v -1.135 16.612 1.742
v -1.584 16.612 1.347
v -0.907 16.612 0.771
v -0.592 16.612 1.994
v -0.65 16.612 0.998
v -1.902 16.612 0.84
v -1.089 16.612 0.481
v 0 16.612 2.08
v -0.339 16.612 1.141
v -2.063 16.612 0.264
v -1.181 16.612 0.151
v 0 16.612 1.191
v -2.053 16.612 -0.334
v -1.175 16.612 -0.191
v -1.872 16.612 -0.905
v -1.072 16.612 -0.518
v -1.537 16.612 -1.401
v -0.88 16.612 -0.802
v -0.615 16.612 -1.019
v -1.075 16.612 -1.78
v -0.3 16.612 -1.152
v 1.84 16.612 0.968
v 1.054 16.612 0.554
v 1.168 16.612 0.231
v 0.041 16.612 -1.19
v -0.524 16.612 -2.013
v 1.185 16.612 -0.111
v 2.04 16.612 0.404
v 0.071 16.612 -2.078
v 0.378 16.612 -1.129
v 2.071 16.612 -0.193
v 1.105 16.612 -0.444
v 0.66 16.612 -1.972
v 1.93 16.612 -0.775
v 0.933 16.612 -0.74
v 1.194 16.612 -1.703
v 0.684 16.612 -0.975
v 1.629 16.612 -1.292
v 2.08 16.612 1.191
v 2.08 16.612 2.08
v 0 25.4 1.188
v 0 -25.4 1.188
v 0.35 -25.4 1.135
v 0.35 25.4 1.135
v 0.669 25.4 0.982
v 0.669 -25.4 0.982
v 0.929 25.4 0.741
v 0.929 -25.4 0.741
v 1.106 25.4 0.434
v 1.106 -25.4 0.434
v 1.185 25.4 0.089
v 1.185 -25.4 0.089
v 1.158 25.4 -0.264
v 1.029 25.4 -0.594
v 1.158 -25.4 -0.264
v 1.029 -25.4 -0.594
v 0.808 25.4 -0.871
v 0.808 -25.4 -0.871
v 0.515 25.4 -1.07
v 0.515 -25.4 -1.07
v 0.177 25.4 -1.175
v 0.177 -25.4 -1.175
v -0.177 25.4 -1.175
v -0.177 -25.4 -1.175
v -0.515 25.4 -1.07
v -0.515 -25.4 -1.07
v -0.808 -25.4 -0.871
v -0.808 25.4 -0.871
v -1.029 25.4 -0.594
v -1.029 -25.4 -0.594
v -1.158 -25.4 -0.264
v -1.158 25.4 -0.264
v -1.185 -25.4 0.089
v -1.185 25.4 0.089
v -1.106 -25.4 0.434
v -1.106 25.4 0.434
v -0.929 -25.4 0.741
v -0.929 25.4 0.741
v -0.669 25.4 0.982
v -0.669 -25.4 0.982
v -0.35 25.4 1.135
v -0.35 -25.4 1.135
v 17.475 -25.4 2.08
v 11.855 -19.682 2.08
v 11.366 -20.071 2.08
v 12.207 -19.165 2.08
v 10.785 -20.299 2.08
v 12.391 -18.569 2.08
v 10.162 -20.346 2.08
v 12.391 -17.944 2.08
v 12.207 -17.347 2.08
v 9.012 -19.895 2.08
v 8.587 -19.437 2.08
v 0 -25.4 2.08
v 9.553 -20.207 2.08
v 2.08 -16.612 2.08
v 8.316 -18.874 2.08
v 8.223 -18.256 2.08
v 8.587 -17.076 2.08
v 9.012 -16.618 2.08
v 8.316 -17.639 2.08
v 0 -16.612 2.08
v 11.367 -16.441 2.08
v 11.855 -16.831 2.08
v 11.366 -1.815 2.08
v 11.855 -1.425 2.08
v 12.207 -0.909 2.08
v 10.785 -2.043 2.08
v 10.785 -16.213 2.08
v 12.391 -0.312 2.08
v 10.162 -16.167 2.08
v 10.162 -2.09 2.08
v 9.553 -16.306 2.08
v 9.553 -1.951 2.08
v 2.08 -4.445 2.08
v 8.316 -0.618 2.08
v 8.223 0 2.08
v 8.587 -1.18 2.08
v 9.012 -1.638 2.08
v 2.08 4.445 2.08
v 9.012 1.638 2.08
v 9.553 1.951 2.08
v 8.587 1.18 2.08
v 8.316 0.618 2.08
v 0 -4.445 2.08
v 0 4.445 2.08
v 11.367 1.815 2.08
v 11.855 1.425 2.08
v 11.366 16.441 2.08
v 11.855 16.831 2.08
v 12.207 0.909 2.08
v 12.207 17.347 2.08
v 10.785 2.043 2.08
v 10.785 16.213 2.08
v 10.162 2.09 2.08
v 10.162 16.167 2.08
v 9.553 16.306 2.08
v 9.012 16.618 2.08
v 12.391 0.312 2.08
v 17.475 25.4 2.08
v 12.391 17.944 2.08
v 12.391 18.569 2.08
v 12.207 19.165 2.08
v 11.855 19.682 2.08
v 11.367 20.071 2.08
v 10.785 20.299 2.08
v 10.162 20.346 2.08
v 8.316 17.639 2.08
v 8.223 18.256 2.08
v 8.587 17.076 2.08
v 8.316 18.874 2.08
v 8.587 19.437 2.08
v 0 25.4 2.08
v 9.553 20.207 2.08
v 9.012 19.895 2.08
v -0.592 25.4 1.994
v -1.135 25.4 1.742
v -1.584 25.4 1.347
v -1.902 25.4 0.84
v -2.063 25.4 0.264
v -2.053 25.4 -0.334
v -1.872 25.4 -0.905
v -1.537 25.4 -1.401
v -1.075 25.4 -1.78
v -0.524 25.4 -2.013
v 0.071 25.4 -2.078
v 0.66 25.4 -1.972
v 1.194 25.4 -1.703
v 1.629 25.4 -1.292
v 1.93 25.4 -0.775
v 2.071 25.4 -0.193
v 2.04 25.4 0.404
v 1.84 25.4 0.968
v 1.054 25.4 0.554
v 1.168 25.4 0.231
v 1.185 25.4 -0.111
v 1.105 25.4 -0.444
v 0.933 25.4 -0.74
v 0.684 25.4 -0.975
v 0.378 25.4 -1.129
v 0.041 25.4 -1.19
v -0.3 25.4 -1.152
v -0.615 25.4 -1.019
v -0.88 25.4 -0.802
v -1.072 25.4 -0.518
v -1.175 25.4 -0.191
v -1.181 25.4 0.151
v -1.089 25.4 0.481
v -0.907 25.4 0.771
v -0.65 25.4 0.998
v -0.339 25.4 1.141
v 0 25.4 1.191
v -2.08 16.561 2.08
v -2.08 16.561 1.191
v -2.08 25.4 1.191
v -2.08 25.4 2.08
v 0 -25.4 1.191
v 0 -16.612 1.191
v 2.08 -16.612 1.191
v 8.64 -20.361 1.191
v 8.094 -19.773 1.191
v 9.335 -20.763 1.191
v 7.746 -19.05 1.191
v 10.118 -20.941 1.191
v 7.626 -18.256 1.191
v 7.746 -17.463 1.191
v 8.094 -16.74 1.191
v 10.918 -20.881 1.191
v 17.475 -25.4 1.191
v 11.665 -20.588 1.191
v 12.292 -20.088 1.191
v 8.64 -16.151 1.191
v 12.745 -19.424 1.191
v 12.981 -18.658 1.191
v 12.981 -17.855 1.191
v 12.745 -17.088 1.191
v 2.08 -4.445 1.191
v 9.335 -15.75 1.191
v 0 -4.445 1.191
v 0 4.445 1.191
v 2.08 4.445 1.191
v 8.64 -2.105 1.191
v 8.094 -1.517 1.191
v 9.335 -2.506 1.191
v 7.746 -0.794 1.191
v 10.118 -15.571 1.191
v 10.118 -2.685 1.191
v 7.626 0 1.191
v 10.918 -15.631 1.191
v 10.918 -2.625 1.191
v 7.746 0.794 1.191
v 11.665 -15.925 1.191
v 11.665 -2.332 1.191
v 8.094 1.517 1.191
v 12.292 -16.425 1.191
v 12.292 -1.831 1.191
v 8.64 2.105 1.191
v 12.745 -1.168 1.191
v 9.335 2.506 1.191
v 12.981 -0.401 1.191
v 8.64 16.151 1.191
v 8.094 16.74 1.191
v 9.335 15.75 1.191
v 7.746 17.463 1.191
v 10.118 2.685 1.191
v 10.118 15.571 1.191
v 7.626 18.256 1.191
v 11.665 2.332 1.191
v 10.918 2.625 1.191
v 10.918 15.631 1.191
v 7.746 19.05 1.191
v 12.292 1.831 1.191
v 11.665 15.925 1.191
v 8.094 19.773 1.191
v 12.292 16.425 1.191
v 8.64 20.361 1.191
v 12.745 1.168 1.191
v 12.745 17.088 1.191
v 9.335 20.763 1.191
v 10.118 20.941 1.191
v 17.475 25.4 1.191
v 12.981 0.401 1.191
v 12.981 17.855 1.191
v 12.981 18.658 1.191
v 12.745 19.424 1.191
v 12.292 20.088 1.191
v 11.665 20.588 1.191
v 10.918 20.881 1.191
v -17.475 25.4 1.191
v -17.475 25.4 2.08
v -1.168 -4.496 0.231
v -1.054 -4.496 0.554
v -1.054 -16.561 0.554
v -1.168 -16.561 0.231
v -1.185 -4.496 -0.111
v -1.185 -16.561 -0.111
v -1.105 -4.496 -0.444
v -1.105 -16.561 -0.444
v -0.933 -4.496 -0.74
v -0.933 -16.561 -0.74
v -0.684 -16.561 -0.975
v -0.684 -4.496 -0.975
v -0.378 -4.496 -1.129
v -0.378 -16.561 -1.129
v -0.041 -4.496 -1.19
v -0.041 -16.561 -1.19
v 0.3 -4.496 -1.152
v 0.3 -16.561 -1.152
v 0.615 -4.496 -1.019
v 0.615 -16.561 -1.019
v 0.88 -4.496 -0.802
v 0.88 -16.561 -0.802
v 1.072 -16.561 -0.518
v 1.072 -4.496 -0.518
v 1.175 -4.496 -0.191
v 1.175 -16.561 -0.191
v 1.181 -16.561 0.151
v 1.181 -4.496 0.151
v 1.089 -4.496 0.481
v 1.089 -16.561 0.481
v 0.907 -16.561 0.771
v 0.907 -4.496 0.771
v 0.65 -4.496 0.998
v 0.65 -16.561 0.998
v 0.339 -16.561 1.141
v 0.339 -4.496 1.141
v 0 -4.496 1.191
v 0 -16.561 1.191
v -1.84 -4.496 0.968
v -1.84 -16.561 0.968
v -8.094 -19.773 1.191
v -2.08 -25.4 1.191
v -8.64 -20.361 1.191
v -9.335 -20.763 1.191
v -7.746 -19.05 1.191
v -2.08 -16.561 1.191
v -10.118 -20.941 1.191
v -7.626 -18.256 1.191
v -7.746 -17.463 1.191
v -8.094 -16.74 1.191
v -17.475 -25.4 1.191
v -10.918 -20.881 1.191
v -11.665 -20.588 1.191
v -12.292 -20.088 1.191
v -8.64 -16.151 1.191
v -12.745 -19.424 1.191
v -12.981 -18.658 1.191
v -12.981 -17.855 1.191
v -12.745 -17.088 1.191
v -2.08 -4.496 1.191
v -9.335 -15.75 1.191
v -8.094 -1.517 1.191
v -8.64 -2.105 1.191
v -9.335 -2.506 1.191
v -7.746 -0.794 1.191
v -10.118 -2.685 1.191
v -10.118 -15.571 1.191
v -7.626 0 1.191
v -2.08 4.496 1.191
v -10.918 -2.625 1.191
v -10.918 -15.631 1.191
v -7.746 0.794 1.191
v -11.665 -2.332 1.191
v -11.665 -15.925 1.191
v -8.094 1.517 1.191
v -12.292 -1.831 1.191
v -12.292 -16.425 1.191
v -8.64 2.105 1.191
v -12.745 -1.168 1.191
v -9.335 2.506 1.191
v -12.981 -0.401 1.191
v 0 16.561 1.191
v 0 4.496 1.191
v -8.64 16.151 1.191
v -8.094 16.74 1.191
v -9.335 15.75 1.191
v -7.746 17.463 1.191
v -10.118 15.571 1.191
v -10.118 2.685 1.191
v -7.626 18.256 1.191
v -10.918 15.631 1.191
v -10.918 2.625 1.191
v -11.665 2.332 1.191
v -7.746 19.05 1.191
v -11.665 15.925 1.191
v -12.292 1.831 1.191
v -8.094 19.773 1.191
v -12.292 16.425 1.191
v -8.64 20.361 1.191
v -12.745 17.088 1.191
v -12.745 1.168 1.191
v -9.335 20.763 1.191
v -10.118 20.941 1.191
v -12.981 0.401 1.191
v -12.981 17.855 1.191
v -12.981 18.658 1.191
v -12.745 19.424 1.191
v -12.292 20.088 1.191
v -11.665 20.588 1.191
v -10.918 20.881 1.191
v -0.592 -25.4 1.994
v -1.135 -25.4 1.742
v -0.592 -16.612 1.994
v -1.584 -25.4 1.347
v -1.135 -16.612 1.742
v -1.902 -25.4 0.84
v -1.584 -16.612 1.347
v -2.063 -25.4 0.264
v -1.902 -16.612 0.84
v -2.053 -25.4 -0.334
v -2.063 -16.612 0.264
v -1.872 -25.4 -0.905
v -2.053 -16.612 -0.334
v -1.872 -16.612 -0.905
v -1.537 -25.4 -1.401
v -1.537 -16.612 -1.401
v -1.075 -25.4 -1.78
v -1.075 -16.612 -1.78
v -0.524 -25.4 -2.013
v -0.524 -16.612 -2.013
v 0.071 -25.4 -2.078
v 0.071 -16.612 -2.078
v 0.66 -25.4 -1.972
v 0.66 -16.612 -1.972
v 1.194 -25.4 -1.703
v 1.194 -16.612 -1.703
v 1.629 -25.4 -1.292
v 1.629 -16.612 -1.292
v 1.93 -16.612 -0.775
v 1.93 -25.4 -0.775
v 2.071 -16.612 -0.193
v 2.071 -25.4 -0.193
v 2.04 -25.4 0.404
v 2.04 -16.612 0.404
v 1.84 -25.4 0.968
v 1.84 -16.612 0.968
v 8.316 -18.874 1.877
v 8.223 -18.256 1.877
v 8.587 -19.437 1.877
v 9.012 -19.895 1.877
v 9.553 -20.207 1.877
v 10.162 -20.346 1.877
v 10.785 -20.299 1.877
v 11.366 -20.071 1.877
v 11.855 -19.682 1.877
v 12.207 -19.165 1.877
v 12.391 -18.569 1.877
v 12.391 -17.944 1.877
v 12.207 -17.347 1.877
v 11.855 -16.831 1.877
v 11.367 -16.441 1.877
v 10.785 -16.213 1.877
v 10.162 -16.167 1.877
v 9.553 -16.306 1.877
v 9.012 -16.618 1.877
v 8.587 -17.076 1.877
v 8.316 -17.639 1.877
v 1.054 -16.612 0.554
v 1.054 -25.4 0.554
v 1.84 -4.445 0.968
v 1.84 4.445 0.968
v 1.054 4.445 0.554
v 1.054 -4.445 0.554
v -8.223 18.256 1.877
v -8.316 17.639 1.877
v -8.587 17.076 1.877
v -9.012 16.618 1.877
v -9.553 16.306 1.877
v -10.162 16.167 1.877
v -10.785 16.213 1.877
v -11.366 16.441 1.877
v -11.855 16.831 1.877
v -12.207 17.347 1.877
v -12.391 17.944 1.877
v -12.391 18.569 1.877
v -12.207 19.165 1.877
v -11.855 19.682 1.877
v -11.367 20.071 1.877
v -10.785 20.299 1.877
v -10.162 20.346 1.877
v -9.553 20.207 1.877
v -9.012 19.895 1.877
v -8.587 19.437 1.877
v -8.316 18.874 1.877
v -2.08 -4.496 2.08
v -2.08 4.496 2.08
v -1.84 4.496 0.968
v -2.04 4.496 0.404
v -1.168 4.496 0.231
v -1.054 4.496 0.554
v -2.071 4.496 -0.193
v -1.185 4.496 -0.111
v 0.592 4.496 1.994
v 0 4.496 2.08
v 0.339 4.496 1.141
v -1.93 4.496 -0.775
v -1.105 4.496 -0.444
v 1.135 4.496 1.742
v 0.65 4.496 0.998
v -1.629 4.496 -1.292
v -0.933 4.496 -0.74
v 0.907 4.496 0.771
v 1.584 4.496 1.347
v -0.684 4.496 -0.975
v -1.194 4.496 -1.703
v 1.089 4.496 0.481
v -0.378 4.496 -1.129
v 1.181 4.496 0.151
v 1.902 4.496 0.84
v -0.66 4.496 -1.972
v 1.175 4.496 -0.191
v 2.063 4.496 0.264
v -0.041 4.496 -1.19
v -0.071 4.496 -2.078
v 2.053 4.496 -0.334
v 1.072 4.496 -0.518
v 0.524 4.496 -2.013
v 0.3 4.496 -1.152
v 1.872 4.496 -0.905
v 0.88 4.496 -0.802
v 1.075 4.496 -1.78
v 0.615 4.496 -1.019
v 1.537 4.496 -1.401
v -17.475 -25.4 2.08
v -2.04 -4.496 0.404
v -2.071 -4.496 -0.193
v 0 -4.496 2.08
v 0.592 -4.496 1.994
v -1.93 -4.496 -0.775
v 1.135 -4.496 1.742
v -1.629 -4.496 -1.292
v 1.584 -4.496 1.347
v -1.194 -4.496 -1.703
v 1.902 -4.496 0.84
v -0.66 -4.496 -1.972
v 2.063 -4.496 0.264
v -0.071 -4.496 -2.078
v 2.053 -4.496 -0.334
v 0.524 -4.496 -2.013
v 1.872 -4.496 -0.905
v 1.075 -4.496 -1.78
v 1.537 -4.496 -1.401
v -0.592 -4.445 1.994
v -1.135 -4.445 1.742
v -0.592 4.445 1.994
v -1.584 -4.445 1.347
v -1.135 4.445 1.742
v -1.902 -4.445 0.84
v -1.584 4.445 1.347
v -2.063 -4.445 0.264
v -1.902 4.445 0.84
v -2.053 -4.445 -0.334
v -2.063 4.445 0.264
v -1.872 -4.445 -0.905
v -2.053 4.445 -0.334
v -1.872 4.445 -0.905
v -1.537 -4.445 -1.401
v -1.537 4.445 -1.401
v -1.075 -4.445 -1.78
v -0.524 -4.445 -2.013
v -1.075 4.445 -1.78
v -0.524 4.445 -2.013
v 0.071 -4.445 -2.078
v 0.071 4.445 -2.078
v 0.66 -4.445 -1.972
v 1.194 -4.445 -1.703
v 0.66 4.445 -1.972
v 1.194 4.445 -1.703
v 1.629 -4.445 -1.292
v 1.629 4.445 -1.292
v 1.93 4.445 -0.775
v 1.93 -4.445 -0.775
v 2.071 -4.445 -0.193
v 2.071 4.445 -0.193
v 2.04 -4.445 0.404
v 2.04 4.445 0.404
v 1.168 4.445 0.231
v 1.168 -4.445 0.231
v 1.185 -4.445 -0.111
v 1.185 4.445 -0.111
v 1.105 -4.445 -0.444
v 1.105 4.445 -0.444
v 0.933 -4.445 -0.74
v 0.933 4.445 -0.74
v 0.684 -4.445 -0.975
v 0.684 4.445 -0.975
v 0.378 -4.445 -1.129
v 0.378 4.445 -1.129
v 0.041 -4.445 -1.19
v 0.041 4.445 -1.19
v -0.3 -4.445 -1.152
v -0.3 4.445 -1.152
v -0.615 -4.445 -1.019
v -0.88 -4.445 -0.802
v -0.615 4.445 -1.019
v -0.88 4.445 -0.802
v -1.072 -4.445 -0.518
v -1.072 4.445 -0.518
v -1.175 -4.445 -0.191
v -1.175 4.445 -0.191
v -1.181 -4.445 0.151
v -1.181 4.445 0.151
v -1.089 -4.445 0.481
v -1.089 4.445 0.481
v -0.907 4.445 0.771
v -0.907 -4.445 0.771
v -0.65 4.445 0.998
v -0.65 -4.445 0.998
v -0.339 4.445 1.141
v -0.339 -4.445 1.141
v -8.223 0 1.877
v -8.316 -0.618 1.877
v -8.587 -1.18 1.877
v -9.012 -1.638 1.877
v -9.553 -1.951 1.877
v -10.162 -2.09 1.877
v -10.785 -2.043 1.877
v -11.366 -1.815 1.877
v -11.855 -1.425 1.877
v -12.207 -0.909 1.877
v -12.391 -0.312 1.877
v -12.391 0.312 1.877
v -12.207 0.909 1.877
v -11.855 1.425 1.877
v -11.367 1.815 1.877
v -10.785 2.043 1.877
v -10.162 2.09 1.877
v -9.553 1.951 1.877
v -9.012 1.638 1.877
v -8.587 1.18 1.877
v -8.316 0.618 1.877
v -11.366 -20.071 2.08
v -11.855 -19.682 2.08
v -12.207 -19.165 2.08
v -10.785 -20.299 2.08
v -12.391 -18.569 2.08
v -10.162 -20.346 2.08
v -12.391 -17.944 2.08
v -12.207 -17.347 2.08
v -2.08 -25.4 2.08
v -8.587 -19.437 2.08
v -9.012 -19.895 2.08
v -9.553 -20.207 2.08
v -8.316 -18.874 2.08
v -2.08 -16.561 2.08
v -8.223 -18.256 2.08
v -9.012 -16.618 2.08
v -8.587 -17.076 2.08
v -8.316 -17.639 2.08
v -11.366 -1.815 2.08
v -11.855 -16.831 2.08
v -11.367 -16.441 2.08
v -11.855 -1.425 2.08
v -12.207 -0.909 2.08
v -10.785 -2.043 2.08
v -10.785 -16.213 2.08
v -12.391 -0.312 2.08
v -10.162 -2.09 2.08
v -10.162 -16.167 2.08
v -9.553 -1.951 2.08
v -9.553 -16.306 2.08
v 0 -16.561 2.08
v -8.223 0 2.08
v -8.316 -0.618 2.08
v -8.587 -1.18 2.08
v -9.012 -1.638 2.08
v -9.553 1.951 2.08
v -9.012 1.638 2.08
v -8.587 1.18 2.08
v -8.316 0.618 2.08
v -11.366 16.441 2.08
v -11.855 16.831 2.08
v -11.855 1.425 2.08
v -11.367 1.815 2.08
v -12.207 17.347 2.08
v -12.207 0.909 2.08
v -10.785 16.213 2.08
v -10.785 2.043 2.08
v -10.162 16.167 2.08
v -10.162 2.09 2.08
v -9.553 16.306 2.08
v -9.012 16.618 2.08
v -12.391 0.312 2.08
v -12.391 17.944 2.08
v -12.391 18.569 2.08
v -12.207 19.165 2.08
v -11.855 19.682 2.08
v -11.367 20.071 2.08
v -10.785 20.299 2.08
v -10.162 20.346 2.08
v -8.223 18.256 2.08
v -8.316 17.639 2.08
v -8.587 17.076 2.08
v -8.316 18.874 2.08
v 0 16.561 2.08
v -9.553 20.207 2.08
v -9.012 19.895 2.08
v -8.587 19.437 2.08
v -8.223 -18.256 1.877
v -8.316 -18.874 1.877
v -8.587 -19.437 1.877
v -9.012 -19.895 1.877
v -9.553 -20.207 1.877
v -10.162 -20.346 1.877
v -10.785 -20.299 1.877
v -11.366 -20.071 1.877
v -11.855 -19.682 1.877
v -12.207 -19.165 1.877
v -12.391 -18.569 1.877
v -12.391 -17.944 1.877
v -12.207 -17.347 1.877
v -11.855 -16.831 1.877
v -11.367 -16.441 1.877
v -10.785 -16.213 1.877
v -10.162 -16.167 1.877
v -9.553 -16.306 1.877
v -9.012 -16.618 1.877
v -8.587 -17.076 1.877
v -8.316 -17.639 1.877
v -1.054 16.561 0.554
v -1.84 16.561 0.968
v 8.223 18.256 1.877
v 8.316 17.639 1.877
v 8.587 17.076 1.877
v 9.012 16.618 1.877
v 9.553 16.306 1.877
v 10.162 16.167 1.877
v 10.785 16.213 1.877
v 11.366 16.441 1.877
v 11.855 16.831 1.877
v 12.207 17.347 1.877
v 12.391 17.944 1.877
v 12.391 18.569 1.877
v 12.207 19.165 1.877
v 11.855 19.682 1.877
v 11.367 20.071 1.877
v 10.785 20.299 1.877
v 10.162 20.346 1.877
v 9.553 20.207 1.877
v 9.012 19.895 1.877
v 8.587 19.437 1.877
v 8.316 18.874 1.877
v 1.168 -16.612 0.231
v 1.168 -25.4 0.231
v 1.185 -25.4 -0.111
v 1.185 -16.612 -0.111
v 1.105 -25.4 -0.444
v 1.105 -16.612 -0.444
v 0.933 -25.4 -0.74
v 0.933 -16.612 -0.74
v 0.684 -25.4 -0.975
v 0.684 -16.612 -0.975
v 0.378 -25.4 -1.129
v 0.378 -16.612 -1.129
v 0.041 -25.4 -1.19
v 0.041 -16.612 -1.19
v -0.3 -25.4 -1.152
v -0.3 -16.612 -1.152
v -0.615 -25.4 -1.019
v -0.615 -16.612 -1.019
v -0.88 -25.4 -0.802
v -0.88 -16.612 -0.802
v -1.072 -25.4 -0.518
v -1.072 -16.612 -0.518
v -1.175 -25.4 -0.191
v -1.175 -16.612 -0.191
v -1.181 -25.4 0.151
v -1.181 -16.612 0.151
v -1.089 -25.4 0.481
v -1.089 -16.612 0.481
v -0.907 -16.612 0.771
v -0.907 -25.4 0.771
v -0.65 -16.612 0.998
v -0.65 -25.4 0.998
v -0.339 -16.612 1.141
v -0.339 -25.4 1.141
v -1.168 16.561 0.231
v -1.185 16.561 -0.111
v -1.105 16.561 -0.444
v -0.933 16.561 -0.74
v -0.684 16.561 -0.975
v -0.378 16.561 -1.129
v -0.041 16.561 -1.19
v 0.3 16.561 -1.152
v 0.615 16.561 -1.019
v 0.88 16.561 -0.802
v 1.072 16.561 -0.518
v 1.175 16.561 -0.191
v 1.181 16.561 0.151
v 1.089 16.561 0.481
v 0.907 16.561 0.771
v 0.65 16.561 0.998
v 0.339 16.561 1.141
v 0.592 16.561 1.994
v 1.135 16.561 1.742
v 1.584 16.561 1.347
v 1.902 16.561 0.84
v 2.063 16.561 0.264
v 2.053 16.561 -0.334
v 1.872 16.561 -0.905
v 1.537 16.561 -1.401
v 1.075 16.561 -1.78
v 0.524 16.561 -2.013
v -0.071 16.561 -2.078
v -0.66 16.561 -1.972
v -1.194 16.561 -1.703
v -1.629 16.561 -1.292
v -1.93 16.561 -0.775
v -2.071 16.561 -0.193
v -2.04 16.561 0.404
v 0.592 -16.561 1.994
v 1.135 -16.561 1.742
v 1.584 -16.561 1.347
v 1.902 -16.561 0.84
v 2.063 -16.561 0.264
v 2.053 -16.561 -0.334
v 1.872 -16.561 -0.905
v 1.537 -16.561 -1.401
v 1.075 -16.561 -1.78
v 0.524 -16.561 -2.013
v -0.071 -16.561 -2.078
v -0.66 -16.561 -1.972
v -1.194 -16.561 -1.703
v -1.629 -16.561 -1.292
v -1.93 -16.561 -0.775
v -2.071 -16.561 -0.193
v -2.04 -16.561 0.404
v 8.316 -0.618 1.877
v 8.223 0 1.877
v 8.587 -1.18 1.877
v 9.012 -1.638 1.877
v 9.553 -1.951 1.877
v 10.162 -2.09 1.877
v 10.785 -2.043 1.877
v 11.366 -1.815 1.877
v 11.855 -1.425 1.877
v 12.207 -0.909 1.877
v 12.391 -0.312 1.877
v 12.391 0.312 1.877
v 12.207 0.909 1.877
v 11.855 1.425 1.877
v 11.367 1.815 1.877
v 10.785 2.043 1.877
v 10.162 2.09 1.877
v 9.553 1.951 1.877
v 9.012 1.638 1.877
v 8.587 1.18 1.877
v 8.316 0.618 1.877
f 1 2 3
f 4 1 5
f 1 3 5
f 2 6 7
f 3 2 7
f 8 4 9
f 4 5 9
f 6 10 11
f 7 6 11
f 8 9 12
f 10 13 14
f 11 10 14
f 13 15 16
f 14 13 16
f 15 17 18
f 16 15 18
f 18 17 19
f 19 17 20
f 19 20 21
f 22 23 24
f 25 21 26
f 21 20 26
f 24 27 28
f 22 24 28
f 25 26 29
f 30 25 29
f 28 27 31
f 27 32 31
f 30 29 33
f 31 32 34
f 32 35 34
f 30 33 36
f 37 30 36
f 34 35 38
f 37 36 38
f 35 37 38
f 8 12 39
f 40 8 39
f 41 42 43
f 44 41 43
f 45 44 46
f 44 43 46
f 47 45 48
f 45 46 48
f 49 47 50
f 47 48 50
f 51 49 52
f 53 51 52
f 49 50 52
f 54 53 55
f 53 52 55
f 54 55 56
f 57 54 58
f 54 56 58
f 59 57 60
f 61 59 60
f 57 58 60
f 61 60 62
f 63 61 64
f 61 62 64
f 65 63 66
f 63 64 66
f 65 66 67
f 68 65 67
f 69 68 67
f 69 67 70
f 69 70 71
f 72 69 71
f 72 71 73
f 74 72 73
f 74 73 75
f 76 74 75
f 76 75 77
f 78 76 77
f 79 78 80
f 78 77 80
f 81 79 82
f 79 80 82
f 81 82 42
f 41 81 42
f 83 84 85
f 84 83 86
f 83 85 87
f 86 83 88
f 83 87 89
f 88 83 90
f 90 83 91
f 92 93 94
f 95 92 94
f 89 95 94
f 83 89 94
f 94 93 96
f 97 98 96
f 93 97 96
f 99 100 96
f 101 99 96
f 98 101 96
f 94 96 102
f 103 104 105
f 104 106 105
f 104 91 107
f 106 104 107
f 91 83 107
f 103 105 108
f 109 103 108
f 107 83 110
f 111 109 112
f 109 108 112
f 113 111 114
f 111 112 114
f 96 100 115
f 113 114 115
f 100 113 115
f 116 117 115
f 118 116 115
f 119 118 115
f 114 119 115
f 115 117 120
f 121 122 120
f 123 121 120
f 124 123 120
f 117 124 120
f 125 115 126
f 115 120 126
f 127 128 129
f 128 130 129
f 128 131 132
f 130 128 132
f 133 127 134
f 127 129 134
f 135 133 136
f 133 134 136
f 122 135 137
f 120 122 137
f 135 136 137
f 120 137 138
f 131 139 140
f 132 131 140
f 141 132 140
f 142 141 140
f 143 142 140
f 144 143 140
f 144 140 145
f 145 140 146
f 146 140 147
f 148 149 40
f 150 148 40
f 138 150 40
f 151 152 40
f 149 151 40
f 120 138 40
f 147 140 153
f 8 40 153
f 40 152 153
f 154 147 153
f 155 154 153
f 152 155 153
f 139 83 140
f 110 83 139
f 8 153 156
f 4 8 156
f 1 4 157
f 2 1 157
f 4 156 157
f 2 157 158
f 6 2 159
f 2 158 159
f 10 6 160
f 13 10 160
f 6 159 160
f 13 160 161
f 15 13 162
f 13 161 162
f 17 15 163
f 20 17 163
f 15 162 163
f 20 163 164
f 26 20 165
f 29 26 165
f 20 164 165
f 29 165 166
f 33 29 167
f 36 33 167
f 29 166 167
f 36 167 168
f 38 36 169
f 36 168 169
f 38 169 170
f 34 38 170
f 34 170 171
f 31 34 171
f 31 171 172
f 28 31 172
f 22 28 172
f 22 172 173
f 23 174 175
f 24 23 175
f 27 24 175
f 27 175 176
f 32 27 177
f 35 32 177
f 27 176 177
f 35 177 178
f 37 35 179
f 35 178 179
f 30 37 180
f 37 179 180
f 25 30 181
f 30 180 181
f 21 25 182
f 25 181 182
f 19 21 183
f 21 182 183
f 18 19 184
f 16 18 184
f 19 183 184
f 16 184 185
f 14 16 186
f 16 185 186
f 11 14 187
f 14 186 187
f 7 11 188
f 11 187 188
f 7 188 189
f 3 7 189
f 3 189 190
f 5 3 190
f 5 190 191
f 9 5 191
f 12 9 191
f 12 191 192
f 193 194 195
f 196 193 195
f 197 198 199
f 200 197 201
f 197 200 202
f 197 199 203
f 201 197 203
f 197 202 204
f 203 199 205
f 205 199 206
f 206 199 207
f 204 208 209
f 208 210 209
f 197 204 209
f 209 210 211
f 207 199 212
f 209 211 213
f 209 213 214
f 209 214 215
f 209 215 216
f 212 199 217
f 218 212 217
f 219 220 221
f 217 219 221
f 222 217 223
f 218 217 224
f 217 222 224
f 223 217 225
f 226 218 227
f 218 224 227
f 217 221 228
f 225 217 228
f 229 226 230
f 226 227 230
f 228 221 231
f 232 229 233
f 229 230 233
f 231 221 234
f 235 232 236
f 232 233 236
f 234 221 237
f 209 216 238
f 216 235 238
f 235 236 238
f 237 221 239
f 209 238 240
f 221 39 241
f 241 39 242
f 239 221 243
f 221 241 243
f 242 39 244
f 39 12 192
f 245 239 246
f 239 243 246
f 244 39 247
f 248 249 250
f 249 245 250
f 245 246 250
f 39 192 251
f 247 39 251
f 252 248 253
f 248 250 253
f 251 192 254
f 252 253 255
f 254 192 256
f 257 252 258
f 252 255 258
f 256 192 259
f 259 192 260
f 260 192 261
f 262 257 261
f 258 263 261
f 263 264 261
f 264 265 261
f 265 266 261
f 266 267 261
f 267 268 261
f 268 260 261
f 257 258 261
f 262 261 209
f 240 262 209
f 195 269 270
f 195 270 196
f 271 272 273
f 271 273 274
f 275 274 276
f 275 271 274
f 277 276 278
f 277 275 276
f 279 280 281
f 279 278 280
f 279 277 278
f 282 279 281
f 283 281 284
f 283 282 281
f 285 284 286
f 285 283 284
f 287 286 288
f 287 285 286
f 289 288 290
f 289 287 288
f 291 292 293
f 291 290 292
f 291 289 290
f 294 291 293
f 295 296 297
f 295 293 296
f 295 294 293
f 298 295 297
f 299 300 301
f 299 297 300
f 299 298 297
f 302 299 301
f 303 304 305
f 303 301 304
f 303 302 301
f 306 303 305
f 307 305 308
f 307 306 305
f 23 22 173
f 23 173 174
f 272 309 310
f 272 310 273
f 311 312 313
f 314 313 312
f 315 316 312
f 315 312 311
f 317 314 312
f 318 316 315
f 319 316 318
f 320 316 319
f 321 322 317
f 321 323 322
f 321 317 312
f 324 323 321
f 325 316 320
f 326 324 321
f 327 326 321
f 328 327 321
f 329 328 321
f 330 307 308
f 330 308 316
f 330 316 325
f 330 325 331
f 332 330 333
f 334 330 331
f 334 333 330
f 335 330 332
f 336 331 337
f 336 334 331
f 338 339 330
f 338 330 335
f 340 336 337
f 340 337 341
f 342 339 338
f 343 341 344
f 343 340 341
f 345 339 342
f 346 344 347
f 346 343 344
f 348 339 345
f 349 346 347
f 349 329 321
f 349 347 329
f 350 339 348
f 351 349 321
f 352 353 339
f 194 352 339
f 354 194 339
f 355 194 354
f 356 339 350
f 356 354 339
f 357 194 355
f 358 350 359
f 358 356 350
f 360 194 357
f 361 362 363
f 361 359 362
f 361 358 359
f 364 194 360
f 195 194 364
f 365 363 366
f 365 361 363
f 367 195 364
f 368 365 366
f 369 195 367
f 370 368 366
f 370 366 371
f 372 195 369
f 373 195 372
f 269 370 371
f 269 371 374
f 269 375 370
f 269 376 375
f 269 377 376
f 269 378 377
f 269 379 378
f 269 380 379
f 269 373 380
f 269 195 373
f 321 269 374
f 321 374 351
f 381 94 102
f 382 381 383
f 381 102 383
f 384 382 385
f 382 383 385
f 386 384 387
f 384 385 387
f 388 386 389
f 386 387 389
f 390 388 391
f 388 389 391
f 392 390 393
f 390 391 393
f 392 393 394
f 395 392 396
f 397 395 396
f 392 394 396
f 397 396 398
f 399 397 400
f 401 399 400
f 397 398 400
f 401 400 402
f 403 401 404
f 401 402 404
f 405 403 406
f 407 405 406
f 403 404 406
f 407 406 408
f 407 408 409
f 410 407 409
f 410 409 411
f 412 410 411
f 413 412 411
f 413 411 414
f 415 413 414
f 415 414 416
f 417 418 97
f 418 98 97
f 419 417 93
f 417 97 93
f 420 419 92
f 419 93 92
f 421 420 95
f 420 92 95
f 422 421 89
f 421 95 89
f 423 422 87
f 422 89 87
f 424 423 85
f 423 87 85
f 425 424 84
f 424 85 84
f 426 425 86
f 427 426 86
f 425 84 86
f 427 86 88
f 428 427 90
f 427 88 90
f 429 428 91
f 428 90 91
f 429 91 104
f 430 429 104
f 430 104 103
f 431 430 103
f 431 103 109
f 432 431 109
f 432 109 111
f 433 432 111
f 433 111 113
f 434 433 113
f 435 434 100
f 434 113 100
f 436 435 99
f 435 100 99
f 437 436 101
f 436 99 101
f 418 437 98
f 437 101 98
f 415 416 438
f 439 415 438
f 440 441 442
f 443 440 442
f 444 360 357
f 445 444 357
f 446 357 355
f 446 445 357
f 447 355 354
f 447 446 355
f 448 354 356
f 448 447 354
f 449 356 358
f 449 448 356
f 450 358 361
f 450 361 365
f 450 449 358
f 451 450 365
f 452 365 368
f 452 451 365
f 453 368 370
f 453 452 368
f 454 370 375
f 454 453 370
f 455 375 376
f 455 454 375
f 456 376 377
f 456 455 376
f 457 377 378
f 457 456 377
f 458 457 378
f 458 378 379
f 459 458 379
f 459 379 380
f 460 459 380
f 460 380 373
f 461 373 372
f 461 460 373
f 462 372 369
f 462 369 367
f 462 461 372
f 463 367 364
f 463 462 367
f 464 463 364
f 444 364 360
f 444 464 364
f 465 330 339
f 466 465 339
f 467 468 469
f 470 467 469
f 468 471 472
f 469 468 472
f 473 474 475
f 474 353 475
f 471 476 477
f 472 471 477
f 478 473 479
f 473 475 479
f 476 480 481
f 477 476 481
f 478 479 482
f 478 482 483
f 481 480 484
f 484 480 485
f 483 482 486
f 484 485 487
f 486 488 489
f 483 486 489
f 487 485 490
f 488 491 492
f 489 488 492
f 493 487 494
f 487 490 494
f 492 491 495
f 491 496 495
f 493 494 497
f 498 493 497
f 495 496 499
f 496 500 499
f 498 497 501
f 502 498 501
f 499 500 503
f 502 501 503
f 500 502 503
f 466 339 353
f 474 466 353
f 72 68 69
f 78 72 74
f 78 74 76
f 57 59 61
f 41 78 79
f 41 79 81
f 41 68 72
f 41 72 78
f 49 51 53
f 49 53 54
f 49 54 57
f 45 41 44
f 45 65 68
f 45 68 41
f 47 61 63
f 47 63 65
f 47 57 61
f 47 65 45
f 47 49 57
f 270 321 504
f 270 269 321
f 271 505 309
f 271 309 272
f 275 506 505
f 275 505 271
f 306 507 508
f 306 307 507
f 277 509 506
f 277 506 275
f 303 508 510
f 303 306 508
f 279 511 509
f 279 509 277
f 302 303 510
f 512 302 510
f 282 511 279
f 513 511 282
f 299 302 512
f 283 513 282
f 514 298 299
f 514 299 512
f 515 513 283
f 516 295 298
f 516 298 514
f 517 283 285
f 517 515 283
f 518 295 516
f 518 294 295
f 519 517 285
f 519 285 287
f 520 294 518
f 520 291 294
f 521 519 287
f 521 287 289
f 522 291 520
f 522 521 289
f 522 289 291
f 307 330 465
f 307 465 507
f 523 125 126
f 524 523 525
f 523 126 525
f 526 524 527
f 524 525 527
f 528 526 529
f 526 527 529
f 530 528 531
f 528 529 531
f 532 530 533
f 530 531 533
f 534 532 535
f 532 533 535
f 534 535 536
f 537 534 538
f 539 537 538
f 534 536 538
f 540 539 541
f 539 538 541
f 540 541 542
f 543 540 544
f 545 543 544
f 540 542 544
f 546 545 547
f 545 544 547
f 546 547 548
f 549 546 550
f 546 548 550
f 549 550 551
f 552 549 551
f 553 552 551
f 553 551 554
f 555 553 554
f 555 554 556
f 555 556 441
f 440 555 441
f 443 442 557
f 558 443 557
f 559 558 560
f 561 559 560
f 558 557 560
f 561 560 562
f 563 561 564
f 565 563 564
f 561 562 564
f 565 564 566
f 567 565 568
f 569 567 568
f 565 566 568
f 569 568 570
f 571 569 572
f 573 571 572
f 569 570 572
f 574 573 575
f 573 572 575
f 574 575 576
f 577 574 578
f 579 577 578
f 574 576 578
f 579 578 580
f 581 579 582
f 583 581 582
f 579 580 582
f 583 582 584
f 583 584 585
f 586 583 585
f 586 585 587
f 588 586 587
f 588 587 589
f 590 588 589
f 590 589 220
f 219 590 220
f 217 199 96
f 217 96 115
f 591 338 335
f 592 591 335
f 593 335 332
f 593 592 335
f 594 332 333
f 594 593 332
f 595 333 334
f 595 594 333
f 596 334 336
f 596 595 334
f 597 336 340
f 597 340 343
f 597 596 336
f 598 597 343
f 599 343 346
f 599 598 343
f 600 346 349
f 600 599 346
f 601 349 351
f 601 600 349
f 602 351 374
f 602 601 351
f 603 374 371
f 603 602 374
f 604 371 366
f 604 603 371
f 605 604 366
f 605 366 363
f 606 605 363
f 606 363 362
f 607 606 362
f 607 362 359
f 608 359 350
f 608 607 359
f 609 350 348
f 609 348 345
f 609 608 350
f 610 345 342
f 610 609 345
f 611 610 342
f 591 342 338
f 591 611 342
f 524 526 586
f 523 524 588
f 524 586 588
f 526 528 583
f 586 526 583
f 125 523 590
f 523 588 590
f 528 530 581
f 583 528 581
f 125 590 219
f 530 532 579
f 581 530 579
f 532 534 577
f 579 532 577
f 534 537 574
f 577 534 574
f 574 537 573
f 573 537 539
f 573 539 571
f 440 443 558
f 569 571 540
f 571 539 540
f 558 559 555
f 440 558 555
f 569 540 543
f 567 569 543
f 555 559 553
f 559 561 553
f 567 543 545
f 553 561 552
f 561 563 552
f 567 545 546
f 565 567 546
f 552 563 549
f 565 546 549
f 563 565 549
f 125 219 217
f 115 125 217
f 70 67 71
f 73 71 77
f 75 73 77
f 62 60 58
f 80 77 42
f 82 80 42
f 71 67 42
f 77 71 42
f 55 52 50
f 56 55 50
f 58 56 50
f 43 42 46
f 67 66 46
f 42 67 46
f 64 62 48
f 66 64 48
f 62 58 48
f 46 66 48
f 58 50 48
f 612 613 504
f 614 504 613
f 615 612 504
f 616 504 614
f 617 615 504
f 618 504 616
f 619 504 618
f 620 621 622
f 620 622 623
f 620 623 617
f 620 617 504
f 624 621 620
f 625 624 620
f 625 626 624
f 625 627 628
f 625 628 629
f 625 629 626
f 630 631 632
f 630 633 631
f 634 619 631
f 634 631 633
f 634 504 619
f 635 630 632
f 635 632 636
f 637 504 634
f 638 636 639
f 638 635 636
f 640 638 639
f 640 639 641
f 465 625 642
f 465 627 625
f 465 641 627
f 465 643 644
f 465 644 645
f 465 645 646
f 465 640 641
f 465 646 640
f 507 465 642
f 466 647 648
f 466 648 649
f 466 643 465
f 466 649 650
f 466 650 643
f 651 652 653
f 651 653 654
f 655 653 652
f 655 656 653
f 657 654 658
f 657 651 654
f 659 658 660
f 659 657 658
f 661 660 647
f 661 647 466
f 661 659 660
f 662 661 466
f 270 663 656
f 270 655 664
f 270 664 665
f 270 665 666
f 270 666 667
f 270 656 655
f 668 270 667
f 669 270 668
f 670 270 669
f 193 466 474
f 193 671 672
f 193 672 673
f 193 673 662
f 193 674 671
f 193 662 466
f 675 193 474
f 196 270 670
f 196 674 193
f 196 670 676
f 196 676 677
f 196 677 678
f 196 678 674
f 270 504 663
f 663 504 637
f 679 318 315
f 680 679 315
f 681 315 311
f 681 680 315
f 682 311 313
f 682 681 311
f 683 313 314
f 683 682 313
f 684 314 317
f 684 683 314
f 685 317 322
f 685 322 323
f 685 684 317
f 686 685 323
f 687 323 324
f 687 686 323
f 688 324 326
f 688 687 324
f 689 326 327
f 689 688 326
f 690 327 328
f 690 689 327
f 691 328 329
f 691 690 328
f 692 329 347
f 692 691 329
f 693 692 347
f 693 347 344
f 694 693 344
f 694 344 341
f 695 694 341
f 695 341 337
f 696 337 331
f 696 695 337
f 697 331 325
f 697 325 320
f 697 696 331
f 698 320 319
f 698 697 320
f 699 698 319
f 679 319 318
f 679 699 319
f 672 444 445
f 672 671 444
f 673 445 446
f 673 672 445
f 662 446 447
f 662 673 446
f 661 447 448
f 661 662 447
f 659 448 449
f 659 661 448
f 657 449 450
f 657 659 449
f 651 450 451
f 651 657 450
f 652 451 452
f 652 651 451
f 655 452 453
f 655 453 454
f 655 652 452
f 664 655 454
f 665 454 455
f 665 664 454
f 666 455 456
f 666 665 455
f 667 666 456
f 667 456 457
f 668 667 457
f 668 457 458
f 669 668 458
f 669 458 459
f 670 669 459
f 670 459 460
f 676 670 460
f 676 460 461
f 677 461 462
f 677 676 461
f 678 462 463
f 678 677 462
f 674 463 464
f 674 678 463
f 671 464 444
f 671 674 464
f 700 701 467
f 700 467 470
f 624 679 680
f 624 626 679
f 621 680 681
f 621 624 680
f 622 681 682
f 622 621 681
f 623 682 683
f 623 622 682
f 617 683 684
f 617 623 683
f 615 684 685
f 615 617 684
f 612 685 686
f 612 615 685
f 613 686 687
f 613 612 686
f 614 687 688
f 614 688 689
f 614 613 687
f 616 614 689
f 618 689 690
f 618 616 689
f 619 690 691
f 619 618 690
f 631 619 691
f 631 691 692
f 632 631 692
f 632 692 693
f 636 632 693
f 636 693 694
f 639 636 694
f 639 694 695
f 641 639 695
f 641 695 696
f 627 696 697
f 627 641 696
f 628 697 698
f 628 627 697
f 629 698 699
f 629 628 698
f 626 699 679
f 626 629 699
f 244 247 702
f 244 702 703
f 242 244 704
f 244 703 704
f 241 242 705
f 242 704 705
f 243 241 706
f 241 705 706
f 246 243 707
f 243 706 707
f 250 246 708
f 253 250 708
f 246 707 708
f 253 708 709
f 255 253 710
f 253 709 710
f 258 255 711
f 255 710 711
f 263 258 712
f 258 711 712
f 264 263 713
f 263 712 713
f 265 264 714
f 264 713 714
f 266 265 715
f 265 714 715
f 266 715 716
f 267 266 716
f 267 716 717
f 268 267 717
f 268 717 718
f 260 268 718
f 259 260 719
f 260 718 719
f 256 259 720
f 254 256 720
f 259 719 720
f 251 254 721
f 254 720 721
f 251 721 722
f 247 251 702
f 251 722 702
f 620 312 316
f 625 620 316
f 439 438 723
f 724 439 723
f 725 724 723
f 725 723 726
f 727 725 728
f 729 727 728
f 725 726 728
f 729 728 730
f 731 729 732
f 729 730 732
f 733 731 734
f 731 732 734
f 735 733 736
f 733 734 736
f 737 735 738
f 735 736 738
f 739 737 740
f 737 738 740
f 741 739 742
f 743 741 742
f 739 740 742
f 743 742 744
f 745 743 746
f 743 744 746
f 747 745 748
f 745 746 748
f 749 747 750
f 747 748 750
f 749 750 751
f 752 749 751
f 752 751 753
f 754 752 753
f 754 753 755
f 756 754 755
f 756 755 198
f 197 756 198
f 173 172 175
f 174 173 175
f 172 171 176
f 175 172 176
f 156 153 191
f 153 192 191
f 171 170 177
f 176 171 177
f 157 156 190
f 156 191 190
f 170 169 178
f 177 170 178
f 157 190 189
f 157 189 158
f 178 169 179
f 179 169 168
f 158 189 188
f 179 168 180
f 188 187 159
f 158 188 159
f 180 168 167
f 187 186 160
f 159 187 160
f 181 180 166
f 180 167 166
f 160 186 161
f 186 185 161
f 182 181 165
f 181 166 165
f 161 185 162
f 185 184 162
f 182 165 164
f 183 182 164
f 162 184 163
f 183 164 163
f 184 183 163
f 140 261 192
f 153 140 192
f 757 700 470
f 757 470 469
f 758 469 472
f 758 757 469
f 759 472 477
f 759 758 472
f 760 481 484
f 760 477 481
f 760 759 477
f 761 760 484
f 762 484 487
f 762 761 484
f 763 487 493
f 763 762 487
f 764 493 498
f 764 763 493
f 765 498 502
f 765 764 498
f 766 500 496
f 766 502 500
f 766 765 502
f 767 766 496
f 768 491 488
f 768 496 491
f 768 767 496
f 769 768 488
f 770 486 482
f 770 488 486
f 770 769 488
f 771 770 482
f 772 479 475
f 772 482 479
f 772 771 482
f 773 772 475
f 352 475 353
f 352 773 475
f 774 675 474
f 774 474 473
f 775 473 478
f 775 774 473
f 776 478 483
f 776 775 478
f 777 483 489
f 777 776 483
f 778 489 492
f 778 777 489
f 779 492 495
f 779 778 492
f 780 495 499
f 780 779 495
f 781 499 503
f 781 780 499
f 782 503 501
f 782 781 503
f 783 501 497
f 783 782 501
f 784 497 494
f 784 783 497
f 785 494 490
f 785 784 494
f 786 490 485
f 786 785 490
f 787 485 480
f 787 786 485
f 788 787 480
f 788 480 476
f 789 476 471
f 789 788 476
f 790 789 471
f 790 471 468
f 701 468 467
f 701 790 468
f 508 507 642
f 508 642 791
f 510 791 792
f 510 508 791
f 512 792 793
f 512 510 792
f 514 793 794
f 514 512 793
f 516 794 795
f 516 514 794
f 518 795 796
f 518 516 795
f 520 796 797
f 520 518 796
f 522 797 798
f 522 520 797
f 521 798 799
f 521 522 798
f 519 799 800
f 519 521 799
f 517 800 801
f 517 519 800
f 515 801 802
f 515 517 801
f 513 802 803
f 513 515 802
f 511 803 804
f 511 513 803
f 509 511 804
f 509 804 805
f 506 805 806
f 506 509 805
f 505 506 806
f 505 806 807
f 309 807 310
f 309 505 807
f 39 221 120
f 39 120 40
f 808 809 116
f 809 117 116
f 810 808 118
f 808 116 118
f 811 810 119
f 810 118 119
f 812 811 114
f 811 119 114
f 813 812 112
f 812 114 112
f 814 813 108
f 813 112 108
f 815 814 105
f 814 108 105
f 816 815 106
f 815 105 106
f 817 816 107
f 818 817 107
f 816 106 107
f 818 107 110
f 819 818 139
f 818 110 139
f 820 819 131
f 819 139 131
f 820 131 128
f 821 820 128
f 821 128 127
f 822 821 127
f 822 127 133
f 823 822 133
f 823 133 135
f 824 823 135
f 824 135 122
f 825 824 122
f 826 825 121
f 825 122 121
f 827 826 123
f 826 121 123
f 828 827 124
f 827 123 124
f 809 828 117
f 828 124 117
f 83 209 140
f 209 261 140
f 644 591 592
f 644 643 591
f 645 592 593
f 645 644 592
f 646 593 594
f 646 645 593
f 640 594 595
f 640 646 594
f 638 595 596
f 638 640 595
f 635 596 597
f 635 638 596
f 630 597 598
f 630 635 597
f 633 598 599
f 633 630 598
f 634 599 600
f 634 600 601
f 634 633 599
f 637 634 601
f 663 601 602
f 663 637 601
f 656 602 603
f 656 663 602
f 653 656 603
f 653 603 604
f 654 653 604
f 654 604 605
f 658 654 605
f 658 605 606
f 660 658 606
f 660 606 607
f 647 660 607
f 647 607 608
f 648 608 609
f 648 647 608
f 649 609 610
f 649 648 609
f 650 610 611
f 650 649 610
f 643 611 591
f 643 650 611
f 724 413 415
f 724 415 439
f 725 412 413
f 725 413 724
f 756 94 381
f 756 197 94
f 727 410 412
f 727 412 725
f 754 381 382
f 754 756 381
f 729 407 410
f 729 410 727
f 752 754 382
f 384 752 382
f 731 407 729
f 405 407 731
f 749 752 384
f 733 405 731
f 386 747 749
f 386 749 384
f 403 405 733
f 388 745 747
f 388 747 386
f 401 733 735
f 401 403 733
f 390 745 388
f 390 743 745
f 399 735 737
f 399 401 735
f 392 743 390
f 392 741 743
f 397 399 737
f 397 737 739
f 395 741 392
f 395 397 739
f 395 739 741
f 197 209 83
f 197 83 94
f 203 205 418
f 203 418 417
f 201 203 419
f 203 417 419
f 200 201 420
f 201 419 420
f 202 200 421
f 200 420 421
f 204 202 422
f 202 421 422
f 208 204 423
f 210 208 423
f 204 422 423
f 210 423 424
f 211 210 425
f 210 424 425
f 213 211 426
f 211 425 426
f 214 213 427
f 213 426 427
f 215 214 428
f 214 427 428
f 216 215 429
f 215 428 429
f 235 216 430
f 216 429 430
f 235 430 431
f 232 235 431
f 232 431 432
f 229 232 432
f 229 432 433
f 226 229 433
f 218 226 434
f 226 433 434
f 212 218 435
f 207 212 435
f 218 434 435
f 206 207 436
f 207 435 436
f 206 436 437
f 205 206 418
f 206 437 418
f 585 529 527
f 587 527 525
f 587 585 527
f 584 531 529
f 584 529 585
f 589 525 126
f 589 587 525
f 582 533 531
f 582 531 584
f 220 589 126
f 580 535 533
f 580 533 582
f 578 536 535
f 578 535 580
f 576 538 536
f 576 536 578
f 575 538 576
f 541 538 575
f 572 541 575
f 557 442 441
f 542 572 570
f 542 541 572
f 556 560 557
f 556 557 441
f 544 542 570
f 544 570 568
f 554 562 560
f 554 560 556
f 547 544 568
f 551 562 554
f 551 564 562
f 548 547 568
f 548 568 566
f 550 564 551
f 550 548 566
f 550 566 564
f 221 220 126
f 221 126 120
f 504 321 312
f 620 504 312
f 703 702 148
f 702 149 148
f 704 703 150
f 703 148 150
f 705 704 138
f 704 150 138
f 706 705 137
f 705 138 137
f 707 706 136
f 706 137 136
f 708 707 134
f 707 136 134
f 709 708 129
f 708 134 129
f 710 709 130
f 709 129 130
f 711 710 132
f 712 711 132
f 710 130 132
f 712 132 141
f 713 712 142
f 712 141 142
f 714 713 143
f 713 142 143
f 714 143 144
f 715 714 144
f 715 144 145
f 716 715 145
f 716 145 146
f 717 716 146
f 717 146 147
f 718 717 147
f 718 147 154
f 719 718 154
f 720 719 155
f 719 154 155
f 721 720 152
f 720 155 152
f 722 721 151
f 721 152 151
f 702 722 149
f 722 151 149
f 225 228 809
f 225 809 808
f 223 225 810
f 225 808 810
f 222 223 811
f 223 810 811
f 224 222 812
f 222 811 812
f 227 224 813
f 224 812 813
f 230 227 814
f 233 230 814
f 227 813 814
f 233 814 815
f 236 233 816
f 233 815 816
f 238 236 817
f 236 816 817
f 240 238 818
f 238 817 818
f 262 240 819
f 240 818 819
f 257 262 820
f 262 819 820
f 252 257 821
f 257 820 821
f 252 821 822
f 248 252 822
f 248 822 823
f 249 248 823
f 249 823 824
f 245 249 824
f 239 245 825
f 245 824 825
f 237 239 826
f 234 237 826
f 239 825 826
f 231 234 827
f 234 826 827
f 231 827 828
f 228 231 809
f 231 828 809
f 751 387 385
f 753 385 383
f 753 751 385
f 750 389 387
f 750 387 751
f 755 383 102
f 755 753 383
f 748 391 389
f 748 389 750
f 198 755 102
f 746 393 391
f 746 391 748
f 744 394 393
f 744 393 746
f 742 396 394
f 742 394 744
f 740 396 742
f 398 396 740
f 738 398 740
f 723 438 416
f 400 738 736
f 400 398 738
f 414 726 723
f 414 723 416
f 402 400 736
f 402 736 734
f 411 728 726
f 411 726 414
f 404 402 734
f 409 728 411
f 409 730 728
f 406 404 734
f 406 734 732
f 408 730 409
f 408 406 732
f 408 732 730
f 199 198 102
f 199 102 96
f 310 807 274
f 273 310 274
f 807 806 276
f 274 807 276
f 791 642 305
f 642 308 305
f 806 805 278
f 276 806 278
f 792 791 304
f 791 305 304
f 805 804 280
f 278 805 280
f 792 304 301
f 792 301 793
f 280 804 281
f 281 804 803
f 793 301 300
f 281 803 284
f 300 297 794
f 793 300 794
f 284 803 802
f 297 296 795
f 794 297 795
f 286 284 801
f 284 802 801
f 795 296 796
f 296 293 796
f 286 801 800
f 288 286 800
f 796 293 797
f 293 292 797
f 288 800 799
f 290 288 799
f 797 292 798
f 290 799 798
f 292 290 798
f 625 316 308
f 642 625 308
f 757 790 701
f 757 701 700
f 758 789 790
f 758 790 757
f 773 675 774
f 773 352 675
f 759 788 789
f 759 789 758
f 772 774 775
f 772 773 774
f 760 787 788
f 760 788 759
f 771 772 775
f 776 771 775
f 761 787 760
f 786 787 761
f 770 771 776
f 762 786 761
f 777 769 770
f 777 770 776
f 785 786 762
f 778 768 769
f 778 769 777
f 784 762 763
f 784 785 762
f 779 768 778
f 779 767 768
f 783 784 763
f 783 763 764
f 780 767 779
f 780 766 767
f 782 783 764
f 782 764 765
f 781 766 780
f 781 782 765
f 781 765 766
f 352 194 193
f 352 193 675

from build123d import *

# Parameters (mm, degrees)
EXTRUDE1_DEPTH          = 25.4
LPATTERN2_COUNT         = 3
LPATTERN2_PITCH         = 18.25625
CUT_EXTRUDE1_DEPTH      = 31.900929681
CUT_EXTRUDE1_DEPTH_BACK = 31.900929681
SKETCH4_W               = 4.15925
SKETCH4_H               = 12.1666
CUT_EXTRUDE2_DEPTH      = 31.900929681
CUT_EXTRUDE2_DEPTH_BACK = 31.900929681
SKETCH5_W               = 4.15925
SKETCH5_H               = 8.8392
SKETCH5_H_2             = 8.9916
EXTRUDE2_START          = -25.4
SKETCH6_R               = 1.188085
EXTRUDE2_DEPTH          = 50.8


with BuildPart() as part:
    # Sketch1 → Extrude1 (new, symmetric)
    with BuildSketch(Plane(origin=(0, 0, 0), x_dir=(1, 0, 0), z_dir=(0, 1, 0))):
        with BuildLine():
            Line((0, -1.190625), (17.4752, -1.190625))
            Line((17.4752, -1.190625), (17.4752, -2.079625))
            Line((17.4752, -2.079625), (0, -2.079625))
            ThreePointArc((0, -2.079625), (-1.074937971, 1.780266413), (1.840404847, -0.968375))
            Line((1.840404847, -0.968375), (1.053666897, -0.554413168))
            ThreePointArc((1.053666897, -0.554413168), (-0.615422502, 1.019236496), (0, -1.190625))
        make_face()
    extrude(amount=EXTRUDE1_DEPTH, both=True)

    # Sketch7 → Cut-Revolve1 (revolve, cut)
    with BuildSketch(Plane(origin=(10.31875, 0, 0), x_dir=(0, 0, -1), z_dir=(1, 0, 0)), mode=Mode.PRIVATE) as cut_revolve1_sk:
        Polygon((-1.190625, 18.25625), (-1.190625, 20.94865), (-1.877279902, 20.35175), (-2.079625, 20.35175), (-2.079625, 18.25625), align=None)
    cut_revolve1 = revolve(cut_revolve1_sk.sketch.rotate(Axis((10.31875, 18.25625, -1.822321443), (0, 0, 1)), 90), axis=Axis((10.31875, 18.25625, -1.822321443), (0, 0, 1)), mode=Mode.SUBTRACT)

    # LPattern2: Cut-Revolve1 ×3
    with Locations(*[(0, -i * LPATTERN2_PITCH, 0) for i in range(1, LPATTERN2_COUNT)]):
        add(cut_revolve1, mode=Mode.SUBTRACT)


with BuildPart() as body_2:
    # Mirror2: mirrored copy
    add(part.part.mirror(Plane(origin=(0, 0, 0), x_dir=(0, 0, 1), z_dir=(1, 0, 0))))

    # Sketch5 → Cut-Extrude2 (cut, two sides: drawn at the far end of the back side and taken through both)
    with BuildSketch(Plane.XY.offset(-CUT_EXTRUDE2_DEPTH_BACK)):
        with Locations((0, -20.9804)):
            Rectangle(SKETCH5_W, SKETCH5_H)
        Rectangle(SKETCH5_W, SKETCH5_H_2)
        with Locations((0, 20.9804)):
            Rectangle(SKETCH5_W, SKETCH5_H)
    extrude(amount=CUT_EXTRUDE2_DEPTH + CUT_EXTRUDE2_DEPTH_BACK, mode=Mode.SUBTRACT)


with BuildPart() as part_1:
    add(part.part)

    # Sketch4 → Cut-Extrude1 (cut, two sides: drawn at the far end of the back side and taken through both)
    with BuildSketch(Plane.XY.offset(-CUT_EXTRUDE1_DEPTH_BACK)):
        with Locations((0, 10.5283)):
            Rectangle(SKETCH4_W, SKETCH4_H)
        with Locations((0, -10.5283)):
            Rectangle(SKETCH4_W, SKETCH4_H)
    extrude(amount=CUT_EXTRUDE1_DEPTH + CUT_EXTRUDE1_DEPTH_BACK, mode=Mode.SUBTRACT)


with BuildPart() as body_3:
    # Sketch6 → Extrude2 (new body)
    with BuildSketch(Plane(origin=(0, 0, 0), x_dir=(1, 0, 0), z_dir=(0, 1, 0)).offset(EXTRUDE2_START)):
        with Locations(Location((0, 0, 0), (0, 0, 270))):
            Circle(SKETCH6_R)
    extrude(amount=EXTRUDE2_DEPTH)


solid = Compound([body_2.part, part_1.part, body_3.part])
